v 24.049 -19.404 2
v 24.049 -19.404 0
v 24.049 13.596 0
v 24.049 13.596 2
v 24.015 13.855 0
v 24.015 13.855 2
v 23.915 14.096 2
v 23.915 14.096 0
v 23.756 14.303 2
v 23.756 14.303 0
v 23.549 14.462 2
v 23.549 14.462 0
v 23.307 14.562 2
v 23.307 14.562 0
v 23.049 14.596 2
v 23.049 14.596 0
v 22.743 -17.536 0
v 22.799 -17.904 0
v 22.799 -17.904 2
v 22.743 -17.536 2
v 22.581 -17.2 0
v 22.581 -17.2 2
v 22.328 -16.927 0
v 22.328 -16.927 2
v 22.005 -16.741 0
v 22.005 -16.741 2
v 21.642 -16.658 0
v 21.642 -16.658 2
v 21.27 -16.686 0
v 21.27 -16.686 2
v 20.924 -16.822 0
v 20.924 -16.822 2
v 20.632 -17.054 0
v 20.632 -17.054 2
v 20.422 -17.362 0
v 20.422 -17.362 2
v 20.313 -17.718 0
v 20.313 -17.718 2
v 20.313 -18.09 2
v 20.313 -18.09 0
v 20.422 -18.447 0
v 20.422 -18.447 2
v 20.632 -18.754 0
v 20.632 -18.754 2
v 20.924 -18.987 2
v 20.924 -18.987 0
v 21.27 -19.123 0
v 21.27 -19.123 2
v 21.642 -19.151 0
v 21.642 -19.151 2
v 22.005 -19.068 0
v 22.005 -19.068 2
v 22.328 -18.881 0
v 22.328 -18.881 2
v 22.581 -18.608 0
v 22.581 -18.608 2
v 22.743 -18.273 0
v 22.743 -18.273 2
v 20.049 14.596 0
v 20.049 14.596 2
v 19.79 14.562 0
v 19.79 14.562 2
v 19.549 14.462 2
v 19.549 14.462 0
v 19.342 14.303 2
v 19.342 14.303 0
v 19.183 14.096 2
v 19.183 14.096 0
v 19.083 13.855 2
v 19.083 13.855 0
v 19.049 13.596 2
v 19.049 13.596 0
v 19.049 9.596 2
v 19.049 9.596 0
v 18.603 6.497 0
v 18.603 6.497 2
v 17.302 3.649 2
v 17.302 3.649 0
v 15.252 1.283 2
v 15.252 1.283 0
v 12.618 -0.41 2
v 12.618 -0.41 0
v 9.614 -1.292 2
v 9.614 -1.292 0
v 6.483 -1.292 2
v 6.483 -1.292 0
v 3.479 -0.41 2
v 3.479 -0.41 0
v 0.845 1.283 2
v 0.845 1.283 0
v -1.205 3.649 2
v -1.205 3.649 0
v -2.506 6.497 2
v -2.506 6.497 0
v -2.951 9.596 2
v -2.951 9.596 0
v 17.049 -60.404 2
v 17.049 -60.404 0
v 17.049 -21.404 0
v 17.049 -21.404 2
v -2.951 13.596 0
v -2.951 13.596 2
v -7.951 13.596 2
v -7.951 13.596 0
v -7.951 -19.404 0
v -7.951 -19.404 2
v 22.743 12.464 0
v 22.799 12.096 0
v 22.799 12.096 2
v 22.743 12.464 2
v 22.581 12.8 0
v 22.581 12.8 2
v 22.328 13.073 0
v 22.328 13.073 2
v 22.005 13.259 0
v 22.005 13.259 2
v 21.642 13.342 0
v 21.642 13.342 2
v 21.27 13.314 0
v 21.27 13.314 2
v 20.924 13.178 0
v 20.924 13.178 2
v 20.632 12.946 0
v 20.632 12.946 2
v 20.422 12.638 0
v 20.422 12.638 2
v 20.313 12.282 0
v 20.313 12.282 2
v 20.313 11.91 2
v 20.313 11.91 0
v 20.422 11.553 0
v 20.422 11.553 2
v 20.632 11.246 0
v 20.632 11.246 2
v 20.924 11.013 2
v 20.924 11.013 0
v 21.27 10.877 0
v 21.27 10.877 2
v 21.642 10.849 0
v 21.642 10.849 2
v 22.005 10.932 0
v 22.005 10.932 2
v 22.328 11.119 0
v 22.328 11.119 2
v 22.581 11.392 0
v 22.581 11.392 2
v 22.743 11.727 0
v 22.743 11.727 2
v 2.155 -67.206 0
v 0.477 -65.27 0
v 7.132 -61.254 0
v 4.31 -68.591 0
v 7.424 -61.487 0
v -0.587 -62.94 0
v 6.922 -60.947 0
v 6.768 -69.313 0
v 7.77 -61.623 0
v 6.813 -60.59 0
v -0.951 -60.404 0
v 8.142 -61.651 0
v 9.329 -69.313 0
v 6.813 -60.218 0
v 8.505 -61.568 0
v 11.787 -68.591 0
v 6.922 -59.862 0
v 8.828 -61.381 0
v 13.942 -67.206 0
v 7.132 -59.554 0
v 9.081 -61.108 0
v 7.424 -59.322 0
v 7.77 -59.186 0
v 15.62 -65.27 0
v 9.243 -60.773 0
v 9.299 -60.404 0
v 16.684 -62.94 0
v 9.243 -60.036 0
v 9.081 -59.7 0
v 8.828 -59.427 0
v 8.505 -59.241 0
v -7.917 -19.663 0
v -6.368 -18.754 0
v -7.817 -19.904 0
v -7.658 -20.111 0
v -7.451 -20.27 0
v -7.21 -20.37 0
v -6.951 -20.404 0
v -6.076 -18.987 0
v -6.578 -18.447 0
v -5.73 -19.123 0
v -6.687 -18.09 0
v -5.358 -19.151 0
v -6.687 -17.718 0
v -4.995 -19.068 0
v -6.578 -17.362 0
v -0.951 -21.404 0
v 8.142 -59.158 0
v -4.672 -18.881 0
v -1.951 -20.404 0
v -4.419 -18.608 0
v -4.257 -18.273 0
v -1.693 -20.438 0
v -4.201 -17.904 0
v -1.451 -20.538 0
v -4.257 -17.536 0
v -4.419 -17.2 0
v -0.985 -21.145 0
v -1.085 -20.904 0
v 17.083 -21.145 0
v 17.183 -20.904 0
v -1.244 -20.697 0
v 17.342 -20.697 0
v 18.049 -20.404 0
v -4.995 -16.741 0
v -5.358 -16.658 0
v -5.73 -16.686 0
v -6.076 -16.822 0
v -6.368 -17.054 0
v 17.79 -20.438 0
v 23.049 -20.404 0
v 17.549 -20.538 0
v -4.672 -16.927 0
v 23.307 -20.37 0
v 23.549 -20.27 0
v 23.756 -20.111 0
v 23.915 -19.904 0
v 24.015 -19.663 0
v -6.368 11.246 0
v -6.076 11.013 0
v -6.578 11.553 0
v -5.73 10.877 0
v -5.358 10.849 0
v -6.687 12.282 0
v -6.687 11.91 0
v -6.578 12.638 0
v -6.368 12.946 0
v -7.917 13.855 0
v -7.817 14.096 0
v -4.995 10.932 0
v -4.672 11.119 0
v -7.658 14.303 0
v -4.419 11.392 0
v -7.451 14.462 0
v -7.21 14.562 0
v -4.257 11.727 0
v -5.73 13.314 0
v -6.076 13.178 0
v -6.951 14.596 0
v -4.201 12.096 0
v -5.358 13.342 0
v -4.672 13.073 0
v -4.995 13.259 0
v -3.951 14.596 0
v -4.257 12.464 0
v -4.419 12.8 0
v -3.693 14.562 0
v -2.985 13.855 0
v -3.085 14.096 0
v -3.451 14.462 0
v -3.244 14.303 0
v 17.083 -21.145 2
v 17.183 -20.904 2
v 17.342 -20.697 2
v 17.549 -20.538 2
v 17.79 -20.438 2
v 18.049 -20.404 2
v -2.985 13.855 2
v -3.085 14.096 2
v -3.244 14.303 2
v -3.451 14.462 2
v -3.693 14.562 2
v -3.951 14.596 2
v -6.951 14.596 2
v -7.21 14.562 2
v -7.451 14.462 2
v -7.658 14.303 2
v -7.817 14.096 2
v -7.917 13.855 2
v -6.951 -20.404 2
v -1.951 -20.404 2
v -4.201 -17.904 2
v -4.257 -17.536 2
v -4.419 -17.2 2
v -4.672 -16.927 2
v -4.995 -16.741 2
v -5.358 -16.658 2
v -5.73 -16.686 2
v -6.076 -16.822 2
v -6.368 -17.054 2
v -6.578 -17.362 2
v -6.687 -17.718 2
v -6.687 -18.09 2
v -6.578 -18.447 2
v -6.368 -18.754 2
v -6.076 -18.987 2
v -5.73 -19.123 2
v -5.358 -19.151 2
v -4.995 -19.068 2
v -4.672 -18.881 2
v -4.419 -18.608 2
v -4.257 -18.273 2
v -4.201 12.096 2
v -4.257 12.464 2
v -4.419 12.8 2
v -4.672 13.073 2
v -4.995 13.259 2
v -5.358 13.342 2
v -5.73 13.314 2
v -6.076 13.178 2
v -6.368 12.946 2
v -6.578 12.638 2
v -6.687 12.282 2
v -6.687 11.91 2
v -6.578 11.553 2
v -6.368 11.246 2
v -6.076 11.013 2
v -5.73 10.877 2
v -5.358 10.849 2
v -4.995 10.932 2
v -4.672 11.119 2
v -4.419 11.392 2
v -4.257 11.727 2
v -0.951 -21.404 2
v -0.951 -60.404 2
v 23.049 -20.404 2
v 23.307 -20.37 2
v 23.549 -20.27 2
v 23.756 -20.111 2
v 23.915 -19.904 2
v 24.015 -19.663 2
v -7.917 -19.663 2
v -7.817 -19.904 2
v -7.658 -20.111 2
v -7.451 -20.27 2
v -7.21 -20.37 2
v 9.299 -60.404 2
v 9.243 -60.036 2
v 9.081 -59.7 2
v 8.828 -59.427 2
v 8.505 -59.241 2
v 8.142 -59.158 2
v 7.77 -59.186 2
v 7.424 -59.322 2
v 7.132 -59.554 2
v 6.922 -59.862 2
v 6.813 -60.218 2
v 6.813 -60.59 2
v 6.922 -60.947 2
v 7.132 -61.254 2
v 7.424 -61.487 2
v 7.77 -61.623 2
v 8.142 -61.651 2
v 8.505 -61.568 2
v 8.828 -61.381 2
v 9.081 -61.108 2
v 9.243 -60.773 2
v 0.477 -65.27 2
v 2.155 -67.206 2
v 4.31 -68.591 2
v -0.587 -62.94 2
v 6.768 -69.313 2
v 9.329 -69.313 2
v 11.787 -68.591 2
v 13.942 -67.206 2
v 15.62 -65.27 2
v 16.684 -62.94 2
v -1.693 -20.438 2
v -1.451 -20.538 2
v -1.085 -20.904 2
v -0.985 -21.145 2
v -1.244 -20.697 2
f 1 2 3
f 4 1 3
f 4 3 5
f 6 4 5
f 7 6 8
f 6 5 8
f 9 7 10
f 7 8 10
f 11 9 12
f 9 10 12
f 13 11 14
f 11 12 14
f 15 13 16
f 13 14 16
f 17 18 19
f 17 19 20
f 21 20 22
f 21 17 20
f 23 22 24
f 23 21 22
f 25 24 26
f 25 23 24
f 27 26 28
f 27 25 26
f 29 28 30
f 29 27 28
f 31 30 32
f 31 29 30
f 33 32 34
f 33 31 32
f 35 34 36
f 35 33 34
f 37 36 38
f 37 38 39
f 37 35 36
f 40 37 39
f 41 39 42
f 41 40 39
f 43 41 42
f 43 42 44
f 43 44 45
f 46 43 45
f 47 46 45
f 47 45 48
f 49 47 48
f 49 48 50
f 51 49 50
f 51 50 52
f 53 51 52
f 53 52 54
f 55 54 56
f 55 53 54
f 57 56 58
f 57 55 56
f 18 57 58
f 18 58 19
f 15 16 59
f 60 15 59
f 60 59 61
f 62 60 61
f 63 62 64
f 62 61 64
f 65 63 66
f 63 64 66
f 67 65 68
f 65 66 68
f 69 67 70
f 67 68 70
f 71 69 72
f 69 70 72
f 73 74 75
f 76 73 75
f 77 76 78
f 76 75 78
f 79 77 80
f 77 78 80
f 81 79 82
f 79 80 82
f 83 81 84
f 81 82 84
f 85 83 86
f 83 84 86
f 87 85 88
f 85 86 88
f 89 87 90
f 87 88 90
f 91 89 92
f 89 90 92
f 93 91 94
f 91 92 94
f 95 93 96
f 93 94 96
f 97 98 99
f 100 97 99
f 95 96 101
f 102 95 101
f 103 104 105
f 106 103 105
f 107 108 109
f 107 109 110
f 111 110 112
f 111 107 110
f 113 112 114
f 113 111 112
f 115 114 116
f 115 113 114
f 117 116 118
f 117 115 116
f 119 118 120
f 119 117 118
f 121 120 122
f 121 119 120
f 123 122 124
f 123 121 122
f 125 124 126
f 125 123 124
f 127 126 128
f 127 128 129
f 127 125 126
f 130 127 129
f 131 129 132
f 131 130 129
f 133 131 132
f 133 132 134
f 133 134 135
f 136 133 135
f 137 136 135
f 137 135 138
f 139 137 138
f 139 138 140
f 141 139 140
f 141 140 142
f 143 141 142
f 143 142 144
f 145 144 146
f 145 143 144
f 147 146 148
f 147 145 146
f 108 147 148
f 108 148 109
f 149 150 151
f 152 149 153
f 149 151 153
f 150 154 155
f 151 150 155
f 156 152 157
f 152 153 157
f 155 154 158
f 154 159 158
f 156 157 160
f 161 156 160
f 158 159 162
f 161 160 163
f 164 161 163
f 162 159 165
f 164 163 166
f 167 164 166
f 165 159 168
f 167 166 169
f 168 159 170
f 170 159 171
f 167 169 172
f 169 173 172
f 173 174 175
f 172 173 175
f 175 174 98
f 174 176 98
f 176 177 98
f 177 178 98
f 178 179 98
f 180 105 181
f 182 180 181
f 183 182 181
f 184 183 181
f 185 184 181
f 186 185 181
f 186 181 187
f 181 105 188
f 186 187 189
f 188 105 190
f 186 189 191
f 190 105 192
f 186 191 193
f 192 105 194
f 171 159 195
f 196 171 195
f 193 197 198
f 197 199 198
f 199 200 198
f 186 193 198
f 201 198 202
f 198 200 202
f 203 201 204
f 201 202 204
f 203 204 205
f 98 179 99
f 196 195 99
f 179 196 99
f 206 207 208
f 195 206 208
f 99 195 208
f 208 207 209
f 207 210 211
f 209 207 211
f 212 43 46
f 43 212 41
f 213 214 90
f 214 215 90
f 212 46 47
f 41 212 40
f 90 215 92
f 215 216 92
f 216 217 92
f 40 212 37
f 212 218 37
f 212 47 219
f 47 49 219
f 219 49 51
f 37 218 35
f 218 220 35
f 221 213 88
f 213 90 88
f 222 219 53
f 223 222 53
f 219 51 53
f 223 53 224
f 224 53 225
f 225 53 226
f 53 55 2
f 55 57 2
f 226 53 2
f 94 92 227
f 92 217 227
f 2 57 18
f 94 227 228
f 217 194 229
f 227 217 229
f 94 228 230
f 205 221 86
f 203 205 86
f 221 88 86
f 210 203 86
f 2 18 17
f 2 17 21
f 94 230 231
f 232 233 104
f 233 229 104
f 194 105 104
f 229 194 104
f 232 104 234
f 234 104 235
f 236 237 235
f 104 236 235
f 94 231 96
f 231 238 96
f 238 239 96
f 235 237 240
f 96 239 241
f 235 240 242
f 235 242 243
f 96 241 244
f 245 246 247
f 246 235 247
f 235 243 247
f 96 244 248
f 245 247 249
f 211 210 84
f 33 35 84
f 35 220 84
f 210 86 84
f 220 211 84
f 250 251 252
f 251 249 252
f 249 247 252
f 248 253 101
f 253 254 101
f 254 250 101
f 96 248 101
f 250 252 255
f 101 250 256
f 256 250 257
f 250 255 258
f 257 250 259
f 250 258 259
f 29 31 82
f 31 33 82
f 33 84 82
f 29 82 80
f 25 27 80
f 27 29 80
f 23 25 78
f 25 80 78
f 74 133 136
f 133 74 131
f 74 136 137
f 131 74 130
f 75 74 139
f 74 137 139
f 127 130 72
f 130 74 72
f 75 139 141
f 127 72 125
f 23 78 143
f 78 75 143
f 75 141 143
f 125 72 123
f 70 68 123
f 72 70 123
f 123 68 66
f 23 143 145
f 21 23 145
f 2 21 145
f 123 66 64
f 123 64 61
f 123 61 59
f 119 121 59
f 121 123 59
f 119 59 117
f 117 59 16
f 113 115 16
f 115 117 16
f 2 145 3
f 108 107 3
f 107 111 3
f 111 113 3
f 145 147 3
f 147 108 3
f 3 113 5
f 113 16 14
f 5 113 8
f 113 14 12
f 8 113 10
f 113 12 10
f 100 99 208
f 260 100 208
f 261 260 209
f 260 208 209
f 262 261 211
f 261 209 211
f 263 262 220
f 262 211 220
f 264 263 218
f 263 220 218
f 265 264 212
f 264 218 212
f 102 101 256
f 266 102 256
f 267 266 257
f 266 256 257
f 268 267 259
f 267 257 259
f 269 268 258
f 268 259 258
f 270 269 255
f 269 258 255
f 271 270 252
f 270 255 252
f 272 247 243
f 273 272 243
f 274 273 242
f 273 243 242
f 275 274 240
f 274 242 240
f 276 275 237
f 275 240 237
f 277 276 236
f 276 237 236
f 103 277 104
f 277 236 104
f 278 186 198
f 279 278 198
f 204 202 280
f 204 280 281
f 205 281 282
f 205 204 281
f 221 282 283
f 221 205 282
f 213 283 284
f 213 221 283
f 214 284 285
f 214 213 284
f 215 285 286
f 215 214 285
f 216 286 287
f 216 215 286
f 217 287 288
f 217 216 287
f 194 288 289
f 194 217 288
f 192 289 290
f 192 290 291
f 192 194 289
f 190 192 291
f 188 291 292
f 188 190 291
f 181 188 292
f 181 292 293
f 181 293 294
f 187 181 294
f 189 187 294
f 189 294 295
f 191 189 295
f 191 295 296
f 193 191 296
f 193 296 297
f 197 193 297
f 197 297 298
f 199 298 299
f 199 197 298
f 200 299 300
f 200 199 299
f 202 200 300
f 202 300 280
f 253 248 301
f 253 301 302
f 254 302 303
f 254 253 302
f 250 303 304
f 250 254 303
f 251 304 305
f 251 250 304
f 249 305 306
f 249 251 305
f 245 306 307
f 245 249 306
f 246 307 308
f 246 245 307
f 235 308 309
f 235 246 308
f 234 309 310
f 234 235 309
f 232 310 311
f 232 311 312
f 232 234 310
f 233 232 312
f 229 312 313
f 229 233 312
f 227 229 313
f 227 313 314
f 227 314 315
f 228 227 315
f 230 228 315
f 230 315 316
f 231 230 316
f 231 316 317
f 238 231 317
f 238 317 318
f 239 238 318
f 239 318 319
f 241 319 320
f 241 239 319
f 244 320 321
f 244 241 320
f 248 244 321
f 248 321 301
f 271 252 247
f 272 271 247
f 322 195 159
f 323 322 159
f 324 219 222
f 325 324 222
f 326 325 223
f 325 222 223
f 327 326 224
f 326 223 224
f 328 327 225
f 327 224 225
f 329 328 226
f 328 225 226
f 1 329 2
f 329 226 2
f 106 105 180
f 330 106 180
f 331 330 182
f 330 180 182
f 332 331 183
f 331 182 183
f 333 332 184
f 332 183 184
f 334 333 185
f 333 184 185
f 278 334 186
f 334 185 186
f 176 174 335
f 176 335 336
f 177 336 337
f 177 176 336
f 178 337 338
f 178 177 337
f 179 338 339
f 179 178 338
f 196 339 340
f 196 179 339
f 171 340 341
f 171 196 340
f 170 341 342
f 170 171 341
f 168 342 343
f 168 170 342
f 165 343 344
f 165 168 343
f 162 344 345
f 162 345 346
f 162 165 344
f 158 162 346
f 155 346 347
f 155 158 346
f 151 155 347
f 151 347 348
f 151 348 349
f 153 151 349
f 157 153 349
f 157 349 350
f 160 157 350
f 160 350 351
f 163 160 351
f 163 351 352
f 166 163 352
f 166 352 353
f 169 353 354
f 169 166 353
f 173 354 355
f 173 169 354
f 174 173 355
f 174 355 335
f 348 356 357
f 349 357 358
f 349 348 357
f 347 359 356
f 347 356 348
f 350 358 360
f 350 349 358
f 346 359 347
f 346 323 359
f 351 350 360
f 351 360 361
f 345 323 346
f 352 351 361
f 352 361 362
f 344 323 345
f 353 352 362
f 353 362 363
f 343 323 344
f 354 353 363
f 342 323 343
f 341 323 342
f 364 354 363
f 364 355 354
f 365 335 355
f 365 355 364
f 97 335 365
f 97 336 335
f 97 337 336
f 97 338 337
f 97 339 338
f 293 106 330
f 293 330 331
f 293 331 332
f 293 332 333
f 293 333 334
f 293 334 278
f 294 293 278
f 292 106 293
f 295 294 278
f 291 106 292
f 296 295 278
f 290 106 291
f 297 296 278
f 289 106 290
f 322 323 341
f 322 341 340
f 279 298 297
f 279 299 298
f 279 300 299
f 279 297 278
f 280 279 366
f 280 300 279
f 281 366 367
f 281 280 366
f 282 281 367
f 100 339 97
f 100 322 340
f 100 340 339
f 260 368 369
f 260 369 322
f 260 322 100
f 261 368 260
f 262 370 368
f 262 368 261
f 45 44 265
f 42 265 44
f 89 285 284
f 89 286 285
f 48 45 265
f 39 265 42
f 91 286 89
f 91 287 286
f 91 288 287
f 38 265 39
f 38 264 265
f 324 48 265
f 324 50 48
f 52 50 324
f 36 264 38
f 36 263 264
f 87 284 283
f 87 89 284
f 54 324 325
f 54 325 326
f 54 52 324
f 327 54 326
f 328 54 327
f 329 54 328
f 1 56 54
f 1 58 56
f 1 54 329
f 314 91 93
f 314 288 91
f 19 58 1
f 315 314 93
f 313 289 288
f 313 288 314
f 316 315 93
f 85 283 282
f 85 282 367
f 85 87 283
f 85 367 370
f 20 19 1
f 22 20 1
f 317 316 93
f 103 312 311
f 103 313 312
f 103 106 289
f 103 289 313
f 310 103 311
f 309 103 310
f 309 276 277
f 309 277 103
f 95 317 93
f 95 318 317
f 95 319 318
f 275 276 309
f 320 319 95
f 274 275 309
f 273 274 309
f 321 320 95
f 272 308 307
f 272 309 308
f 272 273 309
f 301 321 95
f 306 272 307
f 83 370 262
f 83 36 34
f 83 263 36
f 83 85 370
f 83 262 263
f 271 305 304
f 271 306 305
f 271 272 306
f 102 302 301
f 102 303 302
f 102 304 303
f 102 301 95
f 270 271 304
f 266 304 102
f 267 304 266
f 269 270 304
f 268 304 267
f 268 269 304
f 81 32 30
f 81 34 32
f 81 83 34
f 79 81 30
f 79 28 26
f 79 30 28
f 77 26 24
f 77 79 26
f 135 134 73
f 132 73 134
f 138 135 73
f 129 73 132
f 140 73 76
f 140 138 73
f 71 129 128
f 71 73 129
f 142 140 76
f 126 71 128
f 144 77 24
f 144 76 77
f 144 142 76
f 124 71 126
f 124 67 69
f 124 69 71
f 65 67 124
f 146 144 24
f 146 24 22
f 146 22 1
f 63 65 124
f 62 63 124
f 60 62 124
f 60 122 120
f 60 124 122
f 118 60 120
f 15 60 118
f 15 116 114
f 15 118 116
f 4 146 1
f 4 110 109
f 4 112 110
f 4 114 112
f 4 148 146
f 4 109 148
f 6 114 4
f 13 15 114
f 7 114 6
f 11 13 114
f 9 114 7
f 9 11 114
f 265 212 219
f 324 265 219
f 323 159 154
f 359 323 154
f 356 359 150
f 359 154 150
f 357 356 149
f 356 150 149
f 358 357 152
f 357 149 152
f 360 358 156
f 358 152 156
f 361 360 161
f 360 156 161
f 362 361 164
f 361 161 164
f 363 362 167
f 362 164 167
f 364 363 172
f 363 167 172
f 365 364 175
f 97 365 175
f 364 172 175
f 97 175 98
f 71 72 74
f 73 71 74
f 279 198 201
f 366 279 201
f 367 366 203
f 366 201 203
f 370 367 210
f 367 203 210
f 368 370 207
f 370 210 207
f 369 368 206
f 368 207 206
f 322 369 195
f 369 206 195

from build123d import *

# Parameters (mm, degrees)
SKETCH_1_R      = 1.25
EXTRUDE_1_DEPTH = 2


with BuildPart() as part:
    # 草圖1 → 填料-伸長1 (new body)
    with BuildSketch(Plane.XY):
        with BuildLine():
            Line((18.048613933, -20.404186252), (23.048613933, -20.404186252))
            ThreePointArc((23.048613933, -20.404186252), (23.755720714, -20.111293033), (24.048613933, -19.404186252))
            Line((24.048613933, -19.404186252), (24.048613933, -15.404186252))
            Line((24.048613933, -15.404186252), (24.048613933, -2.404186252))
            Line((24.048613933, -2.404186252), (24.048613933, 13.595813748))
            ThreePointArc((24.048613933, 13.595813748), (23.755720714, 14.302920529), (23.048613933, 14.595813748))
            Line((23.048613933, 14.595813748), (20.048613933, 14.595813748))
            ThreePointArc((20.048613933, 14.595813748), (19.341507152, 14.302920529), (19.048613933, 13.595813748))
            Line((19.048613933, 13.595813748), (19.048613933, 9.595813748))
            ThreePointArc((19.048613933, 9.595813748), (8.048613933, -1.404186252), (-2.951386067, 9.595813748))
            Line((-2.951386067, 9.595813748), (-2.951386067, 13.595813748))
            ThreePointArc((-2.951386067, 13.595813748), (-3.244279286, 14.302920529), (-3.951386067, 14.595813748))
            Line((-3.951386067, 14.595813748), (-6.951386067, 14.595813748))
            ThreePointArc((-6.951386067, 14.595813748), (-7.658492848, 14.302920529), (-7.951386067, 13.595813748))
            Line((-7.951386067, 13.595813748), (-7.951386067, -2.404186252))
            Line((-7.951386067, -2.404186252), (-7.951386067, -15.404186252))
            Line((-7.951386067, -15.404186252), (-7.951386067, -19.404186252))
            ThreePointArc((-7.951386067, -19.404186252), (-7.658492848, -20.111293033), (-6.951386067, -20.404186252))
            Line((-6.951386067, -20.404186252), (-1.951386067, -20.404186252))
            ThreePointArc((-1.951386067, -20.404186252), (-1.244279286, -20.697079471), (-0.951386067, -21.404186252))
            Line((-0.951386067, -21.404186252), (-0.951386067, -60.404186252))
            ThreePointArc((-0.951386067, -60.404186252), (8.048613933, -69.404186252), (17.048613933, -60.404186252))
            Line((17.048613933, -60.404186252), (17.048613933, -21.404186252))
            ThreePointArc((17.048613933, -21.404186252), (17.341507152, -20.697079471), (18.048613933, -20.404186252))
        make_face()
        with Locations((8.048613933, -60.404186252)):
            Circle(SKETCH_1_R, mode=Mode.SUBTRACT)
        with Locations((-5.451386067, -17.904186252)):
            Circle(SKETCH_1_R, mode=Mode.SUBTRACT)
        with Locations((-5.451386067, 12.095813748)):
            Circle(SKETCH_1_R, mode=Mode.SUBTRACT)
        with Locations((21.548613933, -17.904186252)):
            Circle(SKETCH_1_R, mode=Mode.SUBTRACT)
        with Locations((21.548613933, 12.095813748)):
            Circle(SKETCH_1_R, mode=Mode.SUBTRACT)
    extrude(amount=EXTRUDE_1_DEPTH)


solid = part.part
